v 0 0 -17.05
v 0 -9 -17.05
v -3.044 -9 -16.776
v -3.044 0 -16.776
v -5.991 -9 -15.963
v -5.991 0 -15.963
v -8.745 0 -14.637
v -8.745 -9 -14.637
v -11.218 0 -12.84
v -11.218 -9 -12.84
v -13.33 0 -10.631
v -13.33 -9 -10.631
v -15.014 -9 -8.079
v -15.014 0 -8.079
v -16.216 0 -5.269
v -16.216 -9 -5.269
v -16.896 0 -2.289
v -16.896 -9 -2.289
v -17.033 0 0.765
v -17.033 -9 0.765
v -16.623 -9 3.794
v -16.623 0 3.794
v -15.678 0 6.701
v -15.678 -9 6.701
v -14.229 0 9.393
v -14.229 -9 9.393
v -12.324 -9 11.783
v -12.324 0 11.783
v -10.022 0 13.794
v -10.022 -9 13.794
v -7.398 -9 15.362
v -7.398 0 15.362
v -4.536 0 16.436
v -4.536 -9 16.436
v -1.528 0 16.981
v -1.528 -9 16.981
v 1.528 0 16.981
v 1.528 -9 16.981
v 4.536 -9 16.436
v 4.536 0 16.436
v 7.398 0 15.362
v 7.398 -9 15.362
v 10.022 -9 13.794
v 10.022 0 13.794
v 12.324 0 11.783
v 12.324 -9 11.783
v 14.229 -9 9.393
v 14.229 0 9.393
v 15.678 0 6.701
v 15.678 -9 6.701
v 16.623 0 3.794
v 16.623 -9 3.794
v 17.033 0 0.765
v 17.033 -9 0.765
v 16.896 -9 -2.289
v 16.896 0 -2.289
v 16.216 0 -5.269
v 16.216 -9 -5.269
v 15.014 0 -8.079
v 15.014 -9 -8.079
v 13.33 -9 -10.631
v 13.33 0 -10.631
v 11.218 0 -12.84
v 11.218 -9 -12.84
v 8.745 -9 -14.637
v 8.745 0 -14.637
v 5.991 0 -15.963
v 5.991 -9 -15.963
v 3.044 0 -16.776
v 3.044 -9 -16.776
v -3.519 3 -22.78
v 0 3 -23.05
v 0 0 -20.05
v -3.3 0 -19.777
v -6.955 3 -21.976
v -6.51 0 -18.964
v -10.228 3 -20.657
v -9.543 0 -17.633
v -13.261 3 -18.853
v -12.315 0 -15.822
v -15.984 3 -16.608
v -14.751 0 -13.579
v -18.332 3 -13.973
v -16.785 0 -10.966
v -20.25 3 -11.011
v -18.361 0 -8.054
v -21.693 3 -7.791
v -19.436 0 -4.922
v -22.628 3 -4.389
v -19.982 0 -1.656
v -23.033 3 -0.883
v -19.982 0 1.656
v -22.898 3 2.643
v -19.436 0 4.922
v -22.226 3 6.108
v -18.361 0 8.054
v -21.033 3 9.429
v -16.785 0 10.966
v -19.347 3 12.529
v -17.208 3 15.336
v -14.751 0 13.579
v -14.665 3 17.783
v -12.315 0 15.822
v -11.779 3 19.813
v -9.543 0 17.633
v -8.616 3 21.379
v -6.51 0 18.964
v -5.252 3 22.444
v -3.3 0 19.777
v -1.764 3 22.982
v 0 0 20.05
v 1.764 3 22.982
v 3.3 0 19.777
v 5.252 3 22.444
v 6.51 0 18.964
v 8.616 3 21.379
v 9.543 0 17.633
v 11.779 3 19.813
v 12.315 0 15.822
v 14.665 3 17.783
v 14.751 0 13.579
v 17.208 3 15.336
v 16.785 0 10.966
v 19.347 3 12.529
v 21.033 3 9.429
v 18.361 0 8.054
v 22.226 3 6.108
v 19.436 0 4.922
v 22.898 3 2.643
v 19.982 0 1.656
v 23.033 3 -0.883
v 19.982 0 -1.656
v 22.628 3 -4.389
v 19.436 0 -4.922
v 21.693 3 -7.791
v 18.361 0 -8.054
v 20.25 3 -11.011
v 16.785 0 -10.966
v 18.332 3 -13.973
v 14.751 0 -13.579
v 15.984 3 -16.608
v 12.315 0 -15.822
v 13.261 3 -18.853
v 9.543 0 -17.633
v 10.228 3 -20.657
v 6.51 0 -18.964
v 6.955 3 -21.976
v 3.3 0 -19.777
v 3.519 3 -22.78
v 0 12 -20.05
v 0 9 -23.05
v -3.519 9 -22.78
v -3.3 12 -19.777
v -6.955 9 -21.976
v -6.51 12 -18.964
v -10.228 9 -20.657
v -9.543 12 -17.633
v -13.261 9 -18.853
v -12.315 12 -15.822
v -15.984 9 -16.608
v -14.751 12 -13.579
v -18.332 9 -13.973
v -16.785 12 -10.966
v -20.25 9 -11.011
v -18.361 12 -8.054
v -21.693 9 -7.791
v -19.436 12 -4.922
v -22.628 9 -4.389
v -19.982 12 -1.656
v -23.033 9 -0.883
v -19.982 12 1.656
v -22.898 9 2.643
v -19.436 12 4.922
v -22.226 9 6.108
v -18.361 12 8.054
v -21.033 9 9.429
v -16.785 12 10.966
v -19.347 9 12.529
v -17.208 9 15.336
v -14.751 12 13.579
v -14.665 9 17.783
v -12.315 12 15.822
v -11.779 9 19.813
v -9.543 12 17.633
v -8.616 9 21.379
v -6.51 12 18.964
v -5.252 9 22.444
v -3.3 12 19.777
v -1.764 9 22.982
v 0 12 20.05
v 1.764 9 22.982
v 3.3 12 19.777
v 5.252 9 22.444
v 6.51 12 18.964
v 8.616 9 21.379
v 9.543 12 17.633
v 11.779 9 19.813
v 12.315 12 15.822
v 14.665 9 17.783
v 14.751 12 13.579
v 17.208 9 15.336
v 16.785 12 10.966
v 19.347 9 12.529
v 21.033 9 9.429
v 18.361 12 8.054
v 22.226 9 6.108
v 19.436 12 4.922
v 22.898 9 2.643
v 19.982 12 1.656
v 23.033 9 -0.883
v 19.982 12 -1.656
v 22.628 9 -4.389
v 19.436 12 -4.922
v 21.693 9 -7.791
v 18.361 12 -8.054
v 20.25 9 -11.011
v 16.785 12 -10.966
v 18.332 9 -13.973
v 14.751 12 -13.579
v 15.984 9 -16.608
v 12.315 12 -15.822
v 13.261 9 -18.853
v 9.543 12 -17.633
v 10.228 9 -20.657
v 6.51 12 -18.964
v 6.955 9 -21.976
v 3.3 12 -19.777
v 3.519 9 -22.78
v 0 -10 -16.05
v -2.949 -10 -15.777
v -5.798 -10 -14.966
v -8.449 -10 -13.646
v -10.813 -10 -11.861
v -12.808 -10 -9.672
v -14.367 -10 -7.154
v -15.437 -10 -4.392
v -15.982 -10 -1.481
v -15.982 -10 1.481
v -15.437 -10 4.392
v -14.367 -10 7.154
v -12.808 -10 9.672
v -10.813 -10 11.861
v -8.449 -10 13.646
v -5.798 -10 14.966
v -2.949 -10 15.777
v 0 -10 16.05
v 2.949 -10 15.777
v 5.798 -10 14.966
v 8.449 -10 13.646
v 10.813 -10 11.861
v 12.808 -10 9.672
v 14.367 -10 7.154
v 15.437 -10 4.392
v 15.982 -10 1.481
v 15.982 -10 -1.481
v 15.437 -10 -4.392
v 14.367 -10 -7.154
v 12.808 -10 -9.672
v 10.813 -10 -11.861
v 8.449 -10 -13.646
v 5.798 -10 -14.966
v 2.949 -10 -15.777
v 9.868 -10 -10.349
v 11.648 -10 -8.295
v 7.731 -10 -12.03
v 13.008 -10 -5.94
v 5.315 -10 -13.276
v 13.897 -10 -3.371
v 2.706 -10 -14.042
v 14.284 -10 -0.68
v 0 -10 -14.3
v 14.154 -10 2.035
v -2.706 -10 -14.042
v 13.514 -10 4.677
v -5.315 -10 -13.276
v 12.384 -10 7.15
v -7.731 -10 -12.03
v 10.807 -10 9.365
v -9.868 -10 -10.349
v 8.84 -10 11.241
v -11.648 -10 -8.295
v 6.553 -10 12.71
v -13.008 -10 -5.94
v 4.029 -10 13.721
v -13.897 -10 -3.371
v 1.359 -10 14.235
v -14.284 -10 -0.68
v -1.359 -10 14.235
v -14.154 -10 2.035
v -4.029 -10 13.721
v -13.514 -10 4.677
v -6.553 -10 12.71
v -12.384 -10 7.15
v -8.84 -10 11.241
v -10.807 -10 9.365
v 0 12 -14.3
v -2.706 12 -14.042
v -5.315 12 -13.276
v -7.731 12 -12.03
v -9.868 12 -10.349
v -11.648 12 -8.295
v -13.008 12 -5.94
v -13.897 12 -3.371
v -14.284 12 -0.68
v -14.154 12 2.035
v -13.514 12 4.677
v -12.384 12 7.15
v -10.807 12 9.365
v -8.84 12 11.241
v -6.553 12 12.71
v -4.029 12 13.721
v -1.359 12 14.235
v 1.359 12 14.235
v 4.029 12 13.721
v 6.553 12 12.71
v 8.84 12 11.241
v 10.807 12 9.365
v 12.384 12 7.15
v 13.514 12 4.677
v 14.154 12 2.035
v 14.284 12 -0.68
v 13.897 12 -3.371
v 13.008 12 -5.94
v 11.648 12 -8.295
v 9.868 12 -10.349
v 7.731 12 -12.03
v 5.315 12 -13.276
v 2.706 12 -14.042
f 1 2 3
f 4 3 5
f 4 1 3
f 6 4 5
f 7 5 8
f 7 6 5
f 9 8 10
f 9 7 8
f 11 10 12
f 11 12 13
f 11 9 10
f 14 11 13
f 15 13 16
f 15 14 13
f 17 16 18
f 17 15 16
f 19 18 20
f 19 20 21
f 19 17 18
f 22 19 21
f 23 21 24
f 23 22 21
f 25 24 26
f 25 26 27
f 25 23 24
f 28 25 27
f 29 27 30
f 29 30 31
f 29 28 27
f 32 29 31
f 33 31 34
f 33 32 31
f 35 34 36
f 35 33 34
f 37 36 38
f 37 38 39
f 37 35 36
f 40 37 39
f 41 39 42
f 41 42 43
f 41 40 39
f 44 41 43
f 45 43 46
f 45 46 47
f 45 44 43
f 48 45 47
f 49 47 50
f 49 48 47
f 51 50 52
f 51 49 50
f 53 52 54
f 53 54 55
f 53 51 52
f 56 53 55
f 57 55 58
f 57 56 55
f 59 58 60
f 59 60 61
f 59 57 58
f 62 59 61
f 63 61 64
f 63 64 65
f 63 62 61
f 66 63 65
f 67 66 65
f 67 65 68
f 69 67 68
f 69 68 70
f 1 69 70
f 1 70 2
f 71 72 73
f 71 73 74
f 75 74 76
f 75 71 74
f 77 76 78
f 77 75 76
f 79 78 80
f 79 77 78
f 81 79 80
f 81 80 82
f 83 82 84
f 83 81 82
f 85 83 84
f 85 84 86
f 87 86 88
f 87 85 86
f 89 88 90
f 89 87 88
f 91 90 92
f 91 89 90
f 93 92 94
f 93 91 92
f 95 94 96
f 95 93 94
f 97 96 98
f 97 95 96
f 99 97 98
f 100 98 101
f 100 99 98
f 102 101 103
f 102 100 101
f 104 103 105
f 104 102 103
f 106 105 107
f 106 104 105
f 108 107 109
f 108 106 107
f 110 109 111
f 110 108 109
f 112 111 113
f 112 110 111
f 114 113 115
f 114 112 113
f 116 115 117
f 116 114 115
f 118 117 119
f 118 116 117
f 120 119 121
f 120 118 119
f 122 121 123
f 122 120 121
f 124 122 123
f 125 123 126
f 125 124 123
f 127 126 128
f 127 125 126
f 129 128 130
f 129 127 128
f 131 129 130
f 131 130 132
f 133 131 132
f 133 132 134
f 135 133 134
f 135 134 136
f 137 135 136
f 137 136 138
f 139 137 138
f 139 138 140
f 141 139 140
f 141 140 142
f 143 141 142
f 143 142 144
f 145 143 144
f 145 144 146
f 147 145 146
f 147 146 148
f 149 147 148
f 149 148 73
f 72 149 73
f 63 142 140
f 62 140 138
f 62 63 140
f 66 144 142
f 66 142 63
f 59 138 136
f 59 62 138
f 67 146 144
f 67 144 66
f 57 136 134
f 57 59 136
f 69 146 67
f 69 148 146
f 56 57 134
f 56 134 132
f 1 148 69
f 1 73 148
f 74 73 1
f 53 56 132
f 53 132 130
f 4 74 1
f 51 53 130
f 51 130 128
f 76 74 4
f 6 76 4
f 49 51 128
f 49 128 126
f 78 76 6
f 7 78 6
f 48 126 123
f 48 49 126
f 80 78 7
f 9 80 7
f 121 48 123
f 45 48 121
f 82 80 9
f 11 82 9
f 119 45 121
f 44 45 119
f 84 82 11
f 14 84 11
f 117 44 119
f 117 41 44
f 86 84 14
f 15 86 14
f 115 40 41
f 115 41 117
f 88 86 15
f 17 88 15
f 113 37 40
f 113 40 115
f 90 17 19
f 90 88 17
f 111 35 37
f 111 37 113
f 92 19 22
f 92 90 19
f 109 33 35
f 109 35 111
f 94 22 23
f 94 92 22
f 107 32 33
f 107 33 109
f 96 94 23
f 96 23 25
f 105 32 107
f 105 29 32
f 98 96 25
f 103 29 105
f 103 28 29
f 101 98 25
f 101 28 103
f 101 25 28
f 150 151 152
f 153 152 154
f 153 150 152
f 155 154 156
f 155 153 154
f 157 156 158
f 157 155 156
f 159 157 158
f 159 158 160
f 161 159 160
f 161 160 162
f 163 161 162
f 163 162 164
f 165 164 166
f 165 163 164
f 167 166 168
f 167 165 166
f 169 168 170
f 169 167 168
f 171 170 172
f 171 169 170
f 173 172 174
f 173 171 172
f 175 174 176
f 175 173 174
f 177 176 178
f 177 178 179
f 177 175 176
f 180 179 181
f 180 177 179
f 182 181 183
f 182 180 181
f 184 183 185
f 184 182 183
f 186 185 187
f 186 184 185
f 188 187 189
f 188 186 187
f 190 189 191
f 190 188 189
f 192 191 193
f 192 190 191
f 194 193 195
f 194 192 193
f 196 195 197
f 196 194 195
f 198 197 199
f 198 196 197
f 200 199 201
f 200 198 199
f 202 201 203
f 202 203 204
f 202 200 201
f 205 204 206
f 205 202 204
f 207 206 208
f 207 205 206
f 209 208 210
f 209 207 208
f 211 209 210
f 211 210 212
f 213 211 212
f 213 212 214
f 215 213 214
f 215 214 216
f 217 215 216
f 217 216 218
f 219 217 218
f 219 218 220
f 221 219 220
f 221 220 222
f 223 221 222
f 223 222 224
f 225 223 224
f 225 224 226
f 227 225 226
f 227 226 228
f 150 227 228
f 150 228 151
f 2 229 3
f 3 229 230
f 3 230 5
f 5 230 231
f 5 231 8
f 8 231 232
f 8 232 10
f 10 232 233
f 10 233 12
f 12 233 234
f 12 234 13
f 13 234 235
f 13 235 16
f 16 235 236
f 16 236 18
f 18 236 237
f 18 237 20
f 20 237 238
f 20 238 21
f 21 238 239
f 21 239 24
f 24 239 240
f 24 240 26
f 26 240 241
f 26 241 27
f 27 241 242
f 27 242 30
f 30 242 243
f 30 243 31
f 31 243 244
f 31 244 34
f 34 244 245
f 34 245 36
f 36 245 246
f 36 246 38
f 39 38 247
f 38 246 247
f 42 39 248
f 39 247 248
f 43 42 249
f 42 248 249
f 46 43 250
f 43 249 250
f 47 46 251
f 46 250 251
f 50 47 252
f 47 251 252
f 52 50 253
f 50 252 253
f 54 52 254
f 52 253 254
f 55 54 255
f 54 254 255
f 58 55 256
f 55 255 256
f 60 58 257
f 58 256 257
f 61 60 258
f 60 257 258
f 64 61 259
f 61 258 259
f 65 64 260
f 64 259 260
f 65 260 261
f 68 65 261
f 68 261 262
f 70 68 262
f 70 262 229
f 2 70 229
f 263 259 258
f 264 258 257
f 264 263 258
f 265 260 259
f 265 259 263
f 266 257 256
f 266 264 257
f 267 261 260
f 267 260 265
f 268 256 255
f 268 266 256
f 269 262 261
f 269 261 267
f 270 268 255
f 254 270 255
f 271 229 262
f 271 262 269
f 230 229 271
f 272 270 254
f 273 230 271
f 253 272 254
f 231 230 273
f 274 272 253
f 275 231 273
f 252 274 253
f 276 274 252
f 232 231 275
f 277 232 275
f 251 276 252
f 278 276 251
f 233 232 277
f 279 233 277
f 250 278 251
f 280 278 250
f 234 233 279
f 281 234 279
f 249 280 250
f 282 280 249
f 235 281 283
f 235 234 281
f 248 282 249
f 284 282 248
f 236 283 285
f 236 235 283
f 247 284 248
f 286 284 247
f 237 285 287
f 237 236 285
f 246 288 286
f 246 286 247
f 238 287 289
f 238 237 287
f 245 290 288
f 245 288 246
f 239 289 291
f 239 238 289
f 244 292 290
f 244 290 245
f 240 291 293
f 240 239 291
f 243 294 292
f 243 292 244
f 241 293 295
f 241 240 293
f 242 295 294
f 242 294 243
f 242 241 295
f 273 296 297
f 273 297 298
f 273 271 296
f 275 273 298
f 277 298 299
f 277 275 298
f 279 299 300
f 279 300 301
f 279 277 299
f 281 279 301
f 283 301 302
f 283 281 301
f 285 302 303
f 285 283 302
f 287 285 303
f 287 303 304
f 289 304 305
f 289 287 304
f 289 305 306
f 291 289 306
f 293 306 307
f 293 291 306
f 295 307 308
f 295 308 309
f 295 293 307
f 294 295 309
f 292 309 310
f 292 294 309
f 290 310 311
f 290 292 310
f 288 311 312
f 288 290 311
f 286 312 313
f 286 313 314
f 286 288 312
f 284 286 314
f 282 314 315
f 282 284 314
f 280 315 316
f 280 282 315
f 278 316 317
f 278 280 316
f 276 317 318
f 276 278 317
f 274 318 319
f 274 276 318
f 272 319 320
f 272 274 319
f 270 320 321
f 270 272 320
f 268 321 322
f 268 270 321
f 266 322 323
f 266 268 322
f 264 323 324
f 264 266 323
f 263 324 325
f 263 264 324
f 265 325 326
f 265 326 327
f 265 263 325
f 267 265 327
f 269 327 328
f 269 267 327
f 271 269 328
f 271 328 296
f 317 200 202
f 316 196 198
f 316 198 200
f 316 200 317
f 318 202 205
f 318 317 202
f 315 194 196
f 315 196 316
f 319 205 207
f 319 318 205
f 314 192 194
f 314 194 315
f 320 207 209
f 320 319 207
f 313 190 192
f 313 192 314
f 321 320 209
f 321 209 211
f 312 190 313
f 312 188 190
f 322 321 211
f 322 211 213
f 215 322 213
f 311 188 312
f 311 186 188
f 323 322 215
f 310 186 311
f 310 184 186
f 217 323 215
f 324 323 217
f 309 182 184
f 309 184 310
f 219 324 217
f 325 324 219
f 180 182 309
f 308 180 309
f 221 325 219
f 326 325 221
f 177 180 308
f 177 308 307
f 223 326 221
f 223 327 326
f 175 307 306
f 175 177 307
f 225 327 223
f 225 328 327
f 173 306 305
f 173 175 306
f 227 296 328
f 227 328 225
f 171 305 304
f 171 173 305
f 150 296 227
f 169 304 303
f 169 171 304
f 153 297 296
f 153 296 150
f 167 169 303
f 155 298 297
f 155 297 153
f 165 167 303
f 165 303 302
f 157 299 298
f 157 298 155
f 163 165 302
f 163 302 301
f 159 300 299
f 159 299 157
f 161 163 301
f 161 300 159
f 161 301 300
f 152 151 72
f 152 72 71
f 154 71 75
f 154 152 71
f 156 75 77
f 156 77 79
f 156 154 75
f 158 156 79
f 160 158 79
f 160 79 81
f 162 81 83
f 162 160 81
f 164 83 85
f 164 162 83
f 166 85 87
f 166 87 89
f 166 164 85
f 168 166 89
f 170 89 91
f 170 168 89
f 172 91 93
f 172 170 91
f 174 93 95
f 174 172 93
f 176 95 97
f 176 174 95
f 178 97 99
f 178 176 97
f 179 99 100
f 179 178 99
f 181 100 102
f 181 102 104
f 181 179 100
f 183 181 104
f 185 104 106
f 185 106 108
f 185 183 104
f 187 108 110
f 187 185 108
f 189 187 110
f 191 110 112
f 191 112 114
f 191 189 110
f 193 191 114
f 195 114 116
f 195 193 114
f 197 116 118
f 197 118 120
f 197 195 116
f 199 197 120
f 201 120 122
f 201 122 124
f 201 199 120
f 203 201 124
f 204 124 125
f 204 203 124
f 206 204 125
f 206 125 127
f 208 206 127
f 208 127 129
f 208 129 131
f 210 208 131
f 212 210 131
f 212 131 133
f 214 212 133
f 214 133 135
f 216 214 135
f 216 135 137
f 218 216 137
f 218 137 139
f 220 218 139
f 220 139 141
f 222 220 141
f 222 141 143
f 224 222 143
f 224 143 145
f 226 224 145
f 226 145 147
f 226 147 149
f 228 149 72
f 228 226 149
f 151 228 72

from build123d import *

# Parameters (mm, degrees)
SKETCH2_W     = 2.75
SKETCH2_H     = 10
CHAMFER1_SIZE = 3
CHAMFER2_SIZE = 1


with BuildPart() as part:
    # Sketch2 → Revolve1 (revolve)
    with BuildSketch(Plane(origin=(0, 0, 0), x_dir=(0, 0, -1), z_dir=(1, 0, 0))):
        Polygon((14.3, 12), (14.3, 0), (17.05, 0), (23.05, 0), (23.05, 12), align=None)
        with Locations((15.675, -5)):
            Rectangle(SKETCH2_W, SKETCH2_H)
    revolve(axis=Axis((0, -11.25, 0), (0, 1, 0)))

    # Chamfer1
    chamfer1_edges = [part.edges().sort_by_distance(p)[0] for p in [
        (0, 12, 23.05),
        (0, 0, 23.05),
    ]]
    chamfer(chamfer1_edges, length=CHAMFER1_SIZE)

    # Chamfer2
    chamfer2_edges = [part.edges().sort_by_distance(p)[0] for p in [
        (0, -10, 17.05),
    ]]
    chamfer(chamfer2_edges, length=CHAMFER2_SIZE)


solid = part.part
